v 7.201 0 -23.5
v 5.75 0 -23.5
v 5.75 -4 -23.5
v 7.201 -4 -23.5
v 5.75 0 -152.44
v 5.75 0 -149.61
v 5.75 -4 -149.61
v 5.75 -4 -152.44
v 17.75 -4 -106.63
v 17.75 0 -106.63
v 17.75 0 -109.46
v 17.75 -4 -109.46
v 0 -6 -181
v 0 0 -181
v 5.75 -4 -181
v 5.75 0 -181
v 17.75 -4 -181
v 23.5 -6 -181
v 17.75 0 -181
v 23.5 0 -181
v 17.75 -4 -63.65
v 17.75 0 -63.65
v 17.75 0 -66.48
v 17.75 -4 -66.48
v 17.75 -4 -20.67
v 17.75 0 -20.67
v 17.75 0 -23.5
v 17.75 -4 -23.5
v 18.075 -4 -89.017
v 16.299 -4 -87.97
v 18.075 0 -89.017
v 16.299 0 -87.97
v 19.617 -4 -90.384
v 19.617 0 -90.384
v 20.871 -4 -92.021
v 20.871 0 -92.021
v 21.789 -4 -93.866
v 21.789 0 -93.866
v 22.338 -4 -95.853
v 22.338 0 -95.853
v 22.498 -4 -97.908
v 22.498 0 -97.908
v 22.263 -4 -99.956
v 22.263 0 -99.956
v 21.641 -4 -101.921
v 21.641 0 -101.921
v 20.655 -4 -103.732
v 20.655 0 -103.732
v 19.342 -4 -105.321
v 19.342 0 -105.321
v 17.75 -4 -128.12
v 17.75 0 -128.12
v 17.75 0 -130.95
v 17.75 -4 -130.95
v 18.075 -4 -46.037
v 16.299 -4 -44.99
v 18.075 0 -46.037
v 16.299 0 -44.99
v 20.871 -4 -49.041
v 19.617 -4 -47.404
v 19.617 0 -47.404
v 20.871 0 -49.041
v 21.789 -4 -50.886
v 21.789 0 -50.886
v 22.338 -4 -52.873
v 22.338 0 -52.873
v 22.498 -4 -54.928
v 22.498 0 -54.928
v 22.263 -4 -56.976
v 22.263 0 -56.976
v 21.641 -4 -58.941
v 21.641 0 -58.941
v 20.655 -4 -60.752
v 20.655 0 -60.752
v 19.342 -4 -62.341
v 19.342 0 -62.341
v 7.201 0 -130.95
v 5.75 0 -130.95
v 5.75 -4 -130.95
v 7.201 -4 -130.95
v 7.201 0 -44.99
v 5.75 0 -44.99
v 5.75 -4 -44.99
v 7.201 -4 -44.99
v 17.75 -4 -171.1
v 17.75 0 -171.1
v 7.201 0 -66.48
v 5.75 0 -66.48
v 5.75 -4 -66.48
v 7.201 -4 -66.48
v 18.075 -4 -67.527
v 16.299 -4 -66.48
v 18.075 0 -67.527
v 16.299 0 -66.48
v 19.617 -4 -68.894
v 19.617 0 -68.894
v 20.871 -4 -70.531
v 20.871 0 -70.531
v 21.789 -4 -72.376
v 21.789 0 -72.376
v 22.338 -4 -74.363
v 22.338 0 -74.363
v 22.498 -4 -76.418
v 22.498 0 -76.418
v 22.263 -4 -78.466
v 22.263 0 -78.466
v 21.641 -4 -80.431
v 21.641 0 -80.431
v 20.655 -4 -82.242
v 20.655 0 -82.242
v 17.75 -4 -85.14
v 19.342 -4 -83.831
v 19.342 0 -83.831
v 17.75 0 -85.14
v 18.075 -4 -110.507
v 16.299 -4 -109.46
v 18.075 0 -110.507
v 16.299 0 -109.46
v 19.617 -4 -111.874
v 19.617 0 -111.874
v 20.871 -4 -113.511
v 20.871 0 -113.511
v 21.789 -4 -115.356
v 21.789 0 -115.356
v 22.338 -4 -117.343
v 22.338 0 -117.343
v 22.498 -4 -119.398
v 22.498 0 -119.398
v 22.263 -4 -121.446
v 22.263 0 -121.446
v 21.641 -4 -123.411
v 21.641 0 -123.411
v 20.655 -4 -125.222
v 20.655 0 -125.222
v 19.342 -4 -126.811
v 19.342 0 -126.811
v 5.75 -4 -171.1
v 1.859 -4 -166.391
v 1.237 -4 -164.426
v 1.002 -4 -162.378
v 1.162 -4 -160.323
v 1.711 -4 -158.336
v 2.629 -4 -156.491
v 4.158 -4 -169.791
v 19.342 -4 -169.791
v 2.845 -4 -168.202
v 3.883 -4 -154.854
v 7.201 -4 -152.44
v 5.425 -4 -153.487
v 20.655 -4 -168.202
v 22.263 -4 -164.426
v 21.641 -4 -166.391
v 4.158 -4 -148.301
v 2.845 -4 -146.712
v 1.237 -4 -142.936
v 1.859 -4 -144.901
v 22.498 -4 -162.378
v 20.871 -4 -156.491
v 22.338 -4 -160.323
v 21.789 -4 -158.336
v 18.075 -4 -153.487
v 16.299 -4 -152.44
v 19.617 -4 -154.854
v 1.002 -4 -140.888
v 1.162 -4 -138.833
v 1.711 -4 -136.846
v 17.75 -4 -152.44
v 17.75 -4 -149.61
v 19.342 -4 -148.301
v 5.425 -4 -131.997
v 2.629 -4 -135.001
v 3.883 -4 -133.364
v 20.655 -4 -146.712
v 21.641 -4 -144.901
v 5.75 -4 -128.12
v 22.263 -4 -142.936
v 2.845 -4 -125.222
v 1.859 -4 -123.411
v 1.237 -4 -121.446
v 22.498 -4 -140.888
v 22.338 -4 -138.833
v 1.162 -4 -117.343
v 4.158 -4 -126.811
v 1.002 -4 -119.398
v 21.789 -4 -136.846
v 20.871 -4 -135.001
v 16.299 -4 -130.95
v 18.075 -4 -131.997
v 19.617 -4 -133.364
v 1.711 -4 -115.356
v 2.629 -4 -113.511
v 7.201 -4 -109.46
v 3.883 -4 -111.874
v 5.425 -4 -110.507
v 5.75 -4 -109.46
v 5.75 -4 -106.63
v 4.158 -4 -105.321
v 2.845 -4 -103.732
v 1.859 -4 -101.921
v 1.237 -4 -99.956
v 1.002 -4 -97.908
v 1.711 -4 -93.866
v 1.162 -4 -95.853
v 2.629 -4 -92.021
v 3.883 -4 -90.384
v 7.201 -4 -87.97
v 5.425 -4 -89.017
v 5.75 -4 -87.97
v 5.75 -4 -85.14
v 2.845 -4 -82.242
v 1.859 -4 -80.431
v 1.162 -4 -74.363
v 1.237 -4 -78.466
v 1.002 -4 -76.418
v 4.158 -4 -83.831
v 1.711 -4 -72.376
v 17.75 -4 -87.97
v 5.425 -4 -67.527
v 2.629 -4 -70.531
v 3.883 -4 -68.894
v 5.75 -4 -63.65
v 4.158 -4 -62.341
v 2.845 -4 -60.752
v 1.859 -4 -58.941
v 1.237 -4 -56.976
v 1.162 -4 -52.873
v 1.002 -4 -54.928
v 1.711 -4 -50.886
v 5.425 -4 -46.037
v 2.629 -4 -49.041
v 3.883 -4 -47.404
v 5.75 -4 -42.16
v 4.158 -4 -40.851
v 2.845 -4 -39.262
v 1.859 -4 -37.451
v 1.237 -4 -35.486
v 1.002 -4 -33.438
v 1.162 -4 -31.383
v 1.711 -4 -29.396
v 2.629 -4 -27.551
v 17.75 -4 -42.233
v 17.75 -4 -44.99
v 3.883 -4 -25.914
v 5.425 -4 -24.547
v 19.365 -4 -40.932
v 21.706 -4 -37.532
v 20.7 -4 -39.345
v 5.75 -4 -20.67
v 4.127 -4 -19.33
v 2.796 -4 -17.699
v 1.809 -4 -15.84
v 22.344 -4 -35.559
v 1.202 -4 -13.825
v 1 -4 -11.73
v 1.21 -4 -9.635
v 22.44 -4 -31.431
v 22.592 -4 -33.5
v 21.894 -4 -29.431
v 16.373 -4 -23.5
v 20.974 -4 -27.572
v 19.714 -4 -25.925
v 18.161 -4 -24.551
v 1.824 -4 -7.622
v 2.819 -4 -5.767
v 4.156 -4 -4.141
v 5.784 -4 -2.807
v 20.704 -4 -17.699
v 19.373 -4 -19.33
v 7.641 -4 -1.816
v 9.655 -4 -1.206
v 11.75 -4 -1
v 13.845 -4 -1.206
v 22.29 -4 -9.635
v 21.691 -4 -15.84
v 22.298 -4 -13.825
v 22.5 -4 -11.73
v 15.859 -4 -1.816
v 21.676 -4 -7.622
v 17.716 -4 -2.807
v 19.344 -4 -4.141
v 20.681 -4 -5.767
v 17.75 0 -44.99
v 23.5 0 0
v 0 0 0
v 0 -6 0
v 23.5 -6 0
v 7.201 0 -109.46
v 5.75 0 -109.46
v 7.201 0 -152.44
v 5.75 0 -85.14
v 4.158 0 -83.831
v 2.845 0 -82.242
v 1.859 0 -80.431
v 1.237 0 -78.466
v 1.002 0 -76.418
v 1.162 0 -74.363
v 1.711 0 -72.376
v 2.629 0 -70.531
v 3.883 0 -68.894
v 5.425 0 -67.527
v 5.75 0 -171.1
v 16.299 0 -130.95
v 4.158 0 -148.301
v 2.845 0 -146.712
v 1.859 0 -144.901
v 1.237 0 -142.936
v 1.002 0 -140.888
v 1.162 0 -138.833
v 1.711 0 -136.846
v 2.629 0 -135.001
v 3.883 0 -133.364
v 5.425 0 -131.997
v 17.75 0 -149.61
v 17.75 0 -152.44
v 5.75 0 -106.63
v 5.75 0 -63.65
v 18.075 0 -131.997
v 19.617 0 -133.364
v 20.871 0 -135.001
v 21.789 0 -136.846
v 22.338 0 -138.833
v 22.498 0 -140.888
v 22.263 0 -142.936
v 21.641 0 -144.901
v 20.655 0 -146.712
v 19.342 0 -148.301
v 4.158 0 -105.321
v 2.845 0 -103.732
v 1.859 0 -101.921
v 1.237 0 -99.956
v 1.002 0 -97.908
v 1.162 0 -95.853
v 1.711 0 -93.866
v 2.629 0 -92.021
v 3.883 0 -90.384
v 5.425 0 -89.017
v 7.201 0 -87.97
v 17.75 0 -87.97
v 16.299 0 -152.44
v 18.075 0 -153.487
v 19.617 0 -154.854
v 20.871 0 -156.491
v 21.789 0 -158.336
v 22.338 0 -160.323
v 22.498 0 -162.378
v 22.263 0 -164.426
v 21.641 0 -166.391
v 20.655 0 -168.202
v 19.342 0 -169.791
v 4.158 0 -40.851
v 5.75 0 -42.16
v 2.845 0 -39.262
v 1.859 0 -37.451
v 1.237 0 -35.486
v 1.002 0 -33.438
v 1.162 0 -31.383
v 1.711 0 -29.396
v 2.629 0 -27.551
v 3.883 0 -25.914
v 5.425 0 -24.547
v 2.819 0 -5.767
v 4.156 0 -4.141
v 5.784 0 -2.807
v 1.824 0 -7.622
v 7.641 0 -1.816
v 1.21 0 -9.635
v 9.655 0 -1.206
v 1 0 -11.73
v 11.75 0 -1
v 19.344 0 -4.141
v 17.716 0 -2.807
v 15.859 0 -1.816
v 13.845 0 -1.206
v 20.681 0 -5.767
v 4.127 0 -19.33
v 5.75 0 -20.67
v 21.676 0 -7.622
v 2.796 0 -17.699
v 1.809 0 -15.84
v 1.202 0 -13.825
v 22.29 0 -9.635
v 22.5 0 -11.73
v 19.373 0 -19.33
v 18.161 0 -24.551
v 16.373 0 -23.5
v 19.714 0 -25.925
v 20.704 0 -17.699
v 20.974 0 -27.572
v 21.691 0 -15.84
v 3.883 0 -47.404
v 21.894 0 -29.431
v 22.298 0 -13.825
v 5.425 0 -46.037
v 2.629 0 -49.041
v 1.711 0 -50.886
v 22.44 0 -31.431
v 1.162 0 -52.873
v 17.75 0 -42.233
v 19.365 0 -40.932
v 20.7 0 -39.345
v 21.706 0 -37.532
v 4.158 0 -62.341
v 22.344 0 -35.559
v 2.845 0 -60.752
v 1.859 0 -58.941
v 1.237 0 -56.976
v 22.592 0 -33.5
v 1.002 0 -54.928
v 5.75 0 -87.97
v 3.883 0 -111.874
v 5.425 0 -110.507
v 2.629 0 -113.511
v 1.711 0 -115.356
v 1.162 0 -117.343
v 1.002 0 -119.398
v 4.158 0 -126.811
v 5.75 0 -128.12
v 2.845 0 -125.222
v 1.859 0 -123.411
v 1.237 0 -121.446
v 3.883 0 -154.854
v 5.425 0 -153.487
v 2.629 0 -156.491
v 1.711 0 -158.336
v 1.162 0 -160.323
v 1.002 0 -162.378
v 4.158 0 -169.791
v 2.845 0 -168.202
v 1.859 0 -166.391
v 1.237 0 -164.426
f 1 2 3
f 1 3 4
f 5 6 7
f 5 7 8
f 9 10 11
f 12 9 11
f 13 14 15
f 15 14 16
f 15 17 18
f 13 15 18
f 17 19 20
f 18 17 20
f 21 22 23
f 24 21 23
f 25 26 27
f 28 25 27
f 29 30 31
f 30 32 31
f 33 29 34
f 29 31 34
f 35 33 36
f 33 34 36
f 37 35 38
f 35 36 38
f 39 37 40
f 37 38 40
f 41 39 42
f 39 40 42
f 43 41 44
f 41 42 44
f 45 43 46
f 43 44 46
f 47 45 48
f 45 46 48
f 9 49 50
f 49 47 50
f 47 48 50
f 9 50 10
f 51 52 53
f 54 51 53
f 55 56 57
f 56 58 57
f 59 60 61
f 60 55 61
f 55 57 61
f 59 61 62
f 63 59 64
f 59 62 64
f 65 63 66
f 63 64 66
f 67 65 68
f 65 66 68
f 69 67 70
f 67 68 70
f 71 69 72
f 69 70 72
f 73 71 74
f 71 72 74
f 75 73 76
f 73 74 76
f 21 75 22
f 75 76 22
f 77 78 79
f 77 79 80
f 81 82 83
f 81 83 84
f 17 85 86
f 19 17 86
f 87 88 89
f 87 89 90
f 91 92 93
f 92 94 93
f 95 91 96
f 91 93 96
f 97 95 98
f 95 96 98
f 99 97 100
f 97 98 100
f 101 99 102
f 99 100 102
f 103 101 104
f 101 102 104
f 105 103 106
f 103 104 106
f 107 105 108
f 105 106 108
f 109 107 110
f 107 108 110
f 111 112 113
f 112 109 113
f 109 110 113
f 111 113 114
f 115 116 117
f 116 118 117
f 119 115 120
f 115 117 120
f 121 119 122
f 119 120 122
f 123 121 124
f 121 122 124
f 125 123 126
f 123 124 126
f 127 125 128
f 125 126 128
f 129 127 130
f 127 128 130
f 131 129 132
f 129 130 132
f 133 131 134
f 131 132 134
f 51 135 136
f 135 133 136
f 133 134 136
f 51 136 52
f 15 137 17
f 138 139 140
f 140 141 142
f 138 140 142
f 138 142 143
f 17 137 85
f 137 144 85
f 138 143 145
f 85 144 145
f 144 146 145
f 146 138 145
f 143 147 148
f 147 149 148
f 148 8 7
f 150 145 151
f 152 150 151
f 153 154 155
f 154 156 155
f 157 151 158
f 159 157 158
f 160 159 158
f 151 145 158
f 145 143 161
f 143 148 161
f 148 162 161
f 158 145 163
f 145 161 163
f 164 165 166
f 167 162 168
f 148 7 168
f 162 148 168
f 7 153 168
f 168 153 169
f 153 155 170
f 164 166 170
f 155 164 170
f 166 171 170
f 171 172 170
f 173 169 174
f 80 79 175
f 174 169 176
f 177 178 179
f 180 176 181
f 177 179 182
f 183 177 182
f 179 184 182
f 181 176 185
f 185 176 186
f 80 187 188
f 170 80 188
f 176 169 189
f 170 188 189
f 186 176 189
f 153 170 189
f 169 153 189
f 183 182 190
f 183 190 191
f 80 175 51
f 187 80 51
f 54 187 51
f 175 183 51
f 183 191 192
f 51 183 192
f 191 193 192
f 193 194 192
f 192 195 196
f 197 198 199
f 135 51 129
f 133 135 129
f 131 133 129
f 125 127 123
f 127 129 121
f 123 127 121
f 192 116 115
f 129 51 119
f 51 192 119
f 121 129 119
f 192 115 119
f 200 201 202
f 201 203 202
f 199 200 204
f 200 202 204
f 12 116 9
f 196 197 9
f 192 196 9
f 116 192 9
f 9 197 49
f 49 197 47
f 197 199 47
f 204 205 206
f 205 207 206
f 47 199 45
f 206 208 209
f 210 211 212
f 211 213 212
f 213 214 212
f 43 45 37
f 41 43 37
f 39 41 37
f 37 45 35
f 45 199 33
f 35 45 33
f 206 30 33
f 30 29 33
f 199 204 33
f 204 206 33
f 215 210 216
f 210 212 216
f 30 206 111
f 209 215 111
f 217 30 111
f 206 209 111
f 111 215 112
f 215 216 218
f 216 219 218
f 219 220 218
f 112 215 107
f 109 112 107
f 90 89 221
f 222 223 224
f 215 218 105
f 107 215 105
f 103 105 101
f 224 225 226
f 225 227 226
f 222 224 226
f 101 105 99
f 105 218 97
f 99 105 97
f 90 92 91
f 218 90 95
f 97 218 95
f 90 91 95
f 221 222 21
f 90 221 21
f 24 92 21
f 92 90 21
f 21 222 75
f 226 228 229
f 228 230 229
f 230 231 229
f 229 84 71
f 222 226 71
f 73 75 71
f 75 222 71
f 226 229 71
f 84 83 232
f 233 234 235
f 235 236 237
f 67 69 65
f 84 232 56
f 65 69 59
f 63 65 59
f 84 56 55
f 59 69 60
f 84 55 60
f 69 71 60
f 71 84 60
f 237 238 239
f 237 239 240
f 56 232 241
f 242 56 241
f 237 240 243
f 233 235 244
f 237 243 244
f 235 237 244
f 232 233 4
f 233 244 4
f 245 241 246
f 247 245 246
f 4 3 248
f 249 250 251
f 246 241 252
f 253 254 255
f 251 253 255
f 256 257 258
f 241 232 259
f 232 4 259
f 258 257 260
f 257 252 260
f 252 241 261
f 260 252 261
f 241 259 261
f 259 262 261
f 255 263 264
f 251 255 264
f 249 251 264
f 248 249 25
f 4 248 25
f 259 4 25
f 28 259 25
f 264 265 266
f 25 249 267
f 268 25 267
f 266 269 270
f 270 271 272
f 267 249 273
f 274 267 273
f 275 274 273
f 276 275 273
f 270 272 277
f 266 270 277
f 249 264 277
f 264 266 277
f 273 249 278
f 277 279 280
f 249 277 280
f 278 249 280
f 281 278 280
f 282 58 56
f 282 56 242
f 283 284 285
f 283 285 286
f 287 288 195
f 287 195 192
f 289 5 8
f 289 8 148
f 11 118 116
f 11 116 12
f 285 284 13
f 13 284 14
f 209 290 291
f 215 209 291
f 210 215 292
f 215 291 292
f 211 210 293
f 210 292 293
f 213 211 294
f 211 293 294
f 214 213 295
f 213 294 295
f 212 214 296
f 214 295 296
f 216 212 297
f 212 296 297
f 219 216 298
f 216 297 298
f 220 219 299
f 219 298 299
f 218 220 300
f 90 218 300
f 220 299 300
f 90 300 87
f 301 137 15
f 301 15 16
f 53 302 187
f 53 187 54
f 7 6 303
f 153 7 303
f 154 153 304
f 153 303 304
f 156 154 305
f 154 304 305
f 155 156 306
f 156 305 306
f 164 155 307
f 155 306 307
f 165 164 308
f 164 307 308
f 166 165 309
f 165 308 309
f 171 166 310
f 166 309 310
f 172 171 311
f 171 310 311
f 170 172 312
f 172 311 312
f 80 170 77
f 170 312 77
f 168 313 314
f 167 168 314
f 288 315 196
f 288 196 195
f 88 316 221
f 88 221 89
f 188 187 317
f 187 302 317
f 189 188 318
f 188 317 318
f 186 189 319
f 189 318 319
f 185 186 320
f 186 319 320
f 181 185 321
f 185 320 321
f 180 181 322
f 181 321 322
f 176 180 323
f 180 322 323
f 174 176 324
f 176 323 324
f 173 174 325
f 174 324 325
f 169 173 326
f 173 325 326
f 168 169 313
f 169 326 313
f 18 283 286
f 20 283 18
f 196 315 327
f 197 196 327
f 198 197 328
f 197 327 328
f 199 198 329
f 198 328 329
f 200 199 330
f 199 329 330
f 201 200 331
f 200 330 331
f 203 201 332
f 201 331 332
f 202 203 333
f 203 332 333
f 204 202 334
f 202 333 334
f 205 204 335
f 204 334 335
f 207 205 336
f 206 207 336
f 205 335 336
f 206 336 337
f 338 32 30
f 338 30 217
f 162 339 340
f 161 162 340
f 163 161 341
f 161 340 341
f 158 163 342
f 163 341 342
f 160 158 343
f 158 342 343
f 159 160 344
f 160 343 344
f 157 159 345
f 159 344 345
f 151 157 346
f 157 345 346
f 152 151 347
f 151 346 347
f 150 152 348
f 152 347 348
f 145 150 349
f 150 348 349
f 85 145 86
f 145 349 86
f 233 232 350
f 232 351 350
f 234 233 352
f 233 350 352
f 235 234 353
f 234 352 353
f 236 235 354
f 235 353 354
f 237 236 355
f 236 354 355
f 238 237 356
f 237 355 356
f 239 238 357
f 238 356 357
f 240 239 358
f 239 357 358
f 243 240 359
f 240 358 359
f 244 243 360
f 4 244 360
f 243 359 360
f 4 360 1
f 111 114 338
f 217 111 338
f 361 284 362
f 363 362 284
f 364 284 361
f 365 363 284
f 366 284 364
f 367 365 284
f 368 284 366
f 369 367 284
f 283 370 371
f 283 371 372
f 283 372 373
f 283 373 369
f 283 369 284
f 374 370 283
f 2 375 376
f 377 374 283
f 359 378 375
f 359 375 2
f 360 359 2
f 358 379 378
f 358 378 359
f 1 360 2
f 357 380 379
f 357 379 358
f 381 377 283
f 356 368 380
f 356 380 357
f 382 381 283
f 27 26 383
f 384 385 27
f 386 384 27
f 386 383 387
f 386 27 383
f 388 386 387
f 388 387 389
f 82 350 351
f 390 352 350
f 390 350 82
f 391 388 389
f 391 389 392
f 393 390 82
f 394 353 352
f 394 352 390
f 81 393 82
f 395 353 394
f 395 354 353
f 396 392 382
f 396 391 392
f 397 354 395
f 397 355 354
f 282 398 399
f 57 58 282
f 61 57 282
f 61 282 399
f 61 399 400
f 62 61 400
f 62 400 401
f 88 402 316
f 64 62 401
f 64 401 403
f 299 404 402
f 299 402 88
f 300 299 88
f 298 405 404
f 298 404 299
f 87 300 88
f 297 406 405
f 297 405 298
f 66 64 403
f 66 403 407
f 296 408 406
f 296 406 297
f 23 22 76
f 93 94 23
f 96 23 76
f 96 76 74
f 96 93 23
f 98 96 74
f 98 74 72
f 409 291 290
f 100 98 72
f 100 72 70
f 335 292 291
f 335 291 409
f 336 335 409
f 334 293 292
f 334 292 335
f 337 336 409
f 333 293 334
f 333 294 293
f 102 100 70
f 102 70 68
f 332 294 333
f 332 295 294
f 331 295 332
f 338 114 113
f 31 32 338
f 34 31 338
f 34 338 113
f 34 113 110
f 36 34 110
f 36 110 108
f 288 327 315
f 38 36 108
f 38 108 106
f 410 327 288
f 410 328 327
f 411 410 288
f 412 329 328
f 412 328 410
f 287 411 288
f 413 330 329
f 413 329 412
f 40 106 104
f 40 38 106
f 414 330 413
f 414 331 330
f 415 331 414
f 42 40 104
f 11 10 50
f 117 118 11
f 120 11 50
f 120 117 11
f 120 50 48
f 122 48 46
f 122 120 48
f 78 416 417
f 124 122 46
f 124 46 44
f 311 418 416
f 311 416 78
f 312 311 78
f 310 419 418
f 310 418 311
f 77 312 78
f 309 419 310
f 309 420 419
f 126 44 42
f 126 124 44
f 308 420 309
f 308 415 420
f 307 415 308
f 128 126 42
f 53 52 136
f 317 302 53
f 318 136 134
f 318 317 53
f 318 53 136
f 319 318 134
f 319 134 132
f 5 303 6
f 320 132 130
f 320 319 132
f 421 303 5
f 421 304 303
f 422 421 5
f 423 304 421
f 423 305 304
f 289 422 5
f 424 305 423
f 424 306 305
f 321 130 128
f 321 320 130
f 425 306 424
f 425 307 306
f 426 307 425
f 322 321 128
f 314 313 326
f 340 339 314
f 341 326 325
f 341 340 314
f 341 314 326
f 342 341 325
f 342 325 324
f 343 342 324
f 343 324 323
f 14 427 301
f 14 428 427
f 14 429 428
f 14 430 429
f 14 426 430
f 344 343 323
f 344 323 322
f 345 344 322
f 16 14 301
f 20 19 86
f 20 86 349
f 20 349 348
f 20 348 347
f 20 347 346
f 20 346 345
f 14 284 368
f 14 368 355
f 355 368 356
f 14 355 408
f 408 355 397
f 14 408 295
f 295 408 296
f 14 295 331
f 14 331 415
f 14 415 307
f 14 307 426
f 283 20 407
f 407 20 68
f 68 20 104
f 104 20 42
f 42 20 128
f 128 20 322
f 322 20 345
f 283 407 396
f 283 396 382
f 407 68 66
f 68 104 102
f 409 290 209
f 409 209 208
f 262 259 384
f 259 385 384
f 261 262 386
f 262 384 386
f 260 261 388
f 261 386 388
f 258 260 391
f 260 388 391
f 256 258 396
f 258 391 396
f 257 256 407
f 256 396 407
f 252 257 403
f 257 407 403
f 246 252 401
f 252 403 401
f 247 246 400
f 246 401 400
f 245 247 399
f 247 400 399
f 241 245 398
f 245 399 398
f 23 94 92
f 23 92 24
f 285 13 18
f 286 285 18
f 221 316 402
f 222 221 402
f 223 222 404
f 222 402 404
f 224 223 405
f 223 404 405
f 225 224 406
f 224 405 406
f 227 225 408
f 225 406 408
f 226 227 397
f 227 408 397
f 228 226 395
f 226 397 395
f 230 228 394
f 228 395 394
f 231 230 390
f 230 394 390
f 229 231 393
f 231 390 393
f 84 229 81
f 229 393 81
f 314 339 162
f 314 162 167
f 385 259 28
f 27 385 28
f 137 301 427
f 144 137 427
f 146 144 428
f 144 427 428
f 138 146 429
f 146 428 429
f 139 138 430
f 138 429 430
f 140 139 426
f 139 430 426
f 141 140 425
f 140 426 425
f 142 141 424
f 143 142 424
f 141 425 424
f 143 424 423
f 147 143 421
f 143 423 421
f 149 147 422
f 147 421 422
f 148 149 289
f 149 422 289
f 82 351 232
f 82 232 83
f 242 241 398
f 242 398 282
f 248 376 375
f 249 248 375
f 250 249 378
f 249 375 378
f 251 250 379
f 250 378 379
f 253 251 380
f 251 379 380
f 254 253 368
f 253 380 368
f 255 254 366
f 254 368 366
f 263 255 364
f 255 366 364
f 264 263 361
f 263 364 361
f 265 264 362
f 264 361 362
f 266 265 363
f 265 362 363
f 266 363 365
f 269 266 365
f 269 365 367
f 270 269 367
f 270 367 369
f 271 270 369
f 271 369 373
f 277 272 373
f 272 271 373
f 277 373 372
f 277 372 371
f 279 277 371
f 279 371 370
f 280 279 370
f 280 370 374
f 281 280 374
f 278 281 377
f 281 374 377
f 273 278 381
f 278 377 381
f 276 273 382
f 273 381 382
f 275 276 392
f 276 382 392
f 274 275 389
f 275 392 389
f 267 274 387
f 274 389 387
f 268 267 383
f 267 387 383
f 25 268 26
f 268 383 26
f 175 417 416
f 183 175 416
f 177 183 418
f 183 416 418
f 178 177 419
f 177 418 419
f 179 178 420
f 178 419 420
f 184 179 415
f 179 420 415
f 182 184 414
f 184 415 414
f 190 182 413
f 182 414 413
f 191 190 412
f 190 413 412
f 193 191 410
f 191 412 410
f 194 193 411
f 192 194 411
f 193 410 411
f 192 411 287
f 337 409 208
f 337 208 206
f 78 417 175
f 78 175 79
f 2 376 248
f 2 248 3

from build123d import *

# Parameters (mm, degrees)
SKETCH1_W           = 23.5
SKETCH1_H           = 181
BOSS_EXTRUDE1_DEPTH = 6
SKETCH2_R           = 10.75
CUT_EXTRUDE1_DEPTH  = 4
SKETCH3_W           = 12
SKETCH3_H           = 2.830218613
CUT_EXTRUDE2_DEPTH  = 4
SKETCH5_R           = 10.75
CUT_EXTRUDE5_DEPTH  = 4
LPATTERN1_COUNT     = 8
LPATTERN1_PITCH     = 21.49
SKETCH4_W           = 12
SKETCH4_H           = 4
CUT_EXTRUDE3_DEPTH  = 8.07


with BuildPart() as part:
    # Sketch1 → Boss-Extrude1 (new body)
    with BuildSketch(Plane(origin=(0, 0, 0), x_dir=(1, 0, 0), z_dir=(0, 1, 0))):
        with Locations((11.75, 90.5)):
            Rectangle(SKETCH1_W, SKETCH1_H)
    extrude(amount=-BOSS_EXTRUDE1_DEPTH)

    # Sketch2 → Cut-Extrude1 (cut)
    with BuildSketch(Plane(origin=(0, 0, 0), x_dir=(1, 0, 0), z_dir=(0, 1, 0))):
        with Locations((11.75, 11.75)):
            Circle(SKETCH2_R)
    cut_extrude1 = extrude(amount=-CUT_EXTRUDE1_DEPTH, mode=Mode.SUBTRACT)

    # Sketch3 → Cut-Extrude2 (cut)
    with BuildSketch(Plane(origin=(0, 0, 0), x_dir=(1, 0, 0), z_dir=(0, 1, 0))):
        with Locations((11.75, 22.084890694)):
            Rectangle(SKETCH3_W, SKETCH3_H)
    cut_extrude2 = extrude(amount=-CUT_EXTRUDE2_DEPTH, mode=Mode.SUBTRACT)

    # Sketch5 → Cut-Extrude5 (cut)
    with BuildSketch(Plane(origin=(0, 0, 0), x_dir=(1, 0, 0), z_dir=(0, 1, 0))):
        with Locations((11.845268795, 33.25)):
            Circle(SKETCH5_R)
    extrude(amount=-CUT_EXTRUDE5_DEPTH, mode=Mode.SUBTRACT)

    # LPattern1: Cut-Extrude1, Cut-Extrude2 ×8
    with Locations(*[(0, 0, -i * LPATTERN1_PITCH) for i in range(1, LPATTERN1_COUNT)]):
        add(cut_extrude1, mode=Mode.SUBTRACT)
        add(cut_extrude2, mode=Mode.SUBTRACT)

    # Sketch4 → Cut-Extrude3 (cut, through all)
    with BuildSketch(Plane.XY.offset(-173.93)):
        with Locations((11.75, -2)):
            Rectangle(SKETCH4_W, SKETCH4_H)
    extrude(amount=-CUT_EXTRUDE3_DEPTH, mode=Mode.SUBTRACT)


solid = part.part
